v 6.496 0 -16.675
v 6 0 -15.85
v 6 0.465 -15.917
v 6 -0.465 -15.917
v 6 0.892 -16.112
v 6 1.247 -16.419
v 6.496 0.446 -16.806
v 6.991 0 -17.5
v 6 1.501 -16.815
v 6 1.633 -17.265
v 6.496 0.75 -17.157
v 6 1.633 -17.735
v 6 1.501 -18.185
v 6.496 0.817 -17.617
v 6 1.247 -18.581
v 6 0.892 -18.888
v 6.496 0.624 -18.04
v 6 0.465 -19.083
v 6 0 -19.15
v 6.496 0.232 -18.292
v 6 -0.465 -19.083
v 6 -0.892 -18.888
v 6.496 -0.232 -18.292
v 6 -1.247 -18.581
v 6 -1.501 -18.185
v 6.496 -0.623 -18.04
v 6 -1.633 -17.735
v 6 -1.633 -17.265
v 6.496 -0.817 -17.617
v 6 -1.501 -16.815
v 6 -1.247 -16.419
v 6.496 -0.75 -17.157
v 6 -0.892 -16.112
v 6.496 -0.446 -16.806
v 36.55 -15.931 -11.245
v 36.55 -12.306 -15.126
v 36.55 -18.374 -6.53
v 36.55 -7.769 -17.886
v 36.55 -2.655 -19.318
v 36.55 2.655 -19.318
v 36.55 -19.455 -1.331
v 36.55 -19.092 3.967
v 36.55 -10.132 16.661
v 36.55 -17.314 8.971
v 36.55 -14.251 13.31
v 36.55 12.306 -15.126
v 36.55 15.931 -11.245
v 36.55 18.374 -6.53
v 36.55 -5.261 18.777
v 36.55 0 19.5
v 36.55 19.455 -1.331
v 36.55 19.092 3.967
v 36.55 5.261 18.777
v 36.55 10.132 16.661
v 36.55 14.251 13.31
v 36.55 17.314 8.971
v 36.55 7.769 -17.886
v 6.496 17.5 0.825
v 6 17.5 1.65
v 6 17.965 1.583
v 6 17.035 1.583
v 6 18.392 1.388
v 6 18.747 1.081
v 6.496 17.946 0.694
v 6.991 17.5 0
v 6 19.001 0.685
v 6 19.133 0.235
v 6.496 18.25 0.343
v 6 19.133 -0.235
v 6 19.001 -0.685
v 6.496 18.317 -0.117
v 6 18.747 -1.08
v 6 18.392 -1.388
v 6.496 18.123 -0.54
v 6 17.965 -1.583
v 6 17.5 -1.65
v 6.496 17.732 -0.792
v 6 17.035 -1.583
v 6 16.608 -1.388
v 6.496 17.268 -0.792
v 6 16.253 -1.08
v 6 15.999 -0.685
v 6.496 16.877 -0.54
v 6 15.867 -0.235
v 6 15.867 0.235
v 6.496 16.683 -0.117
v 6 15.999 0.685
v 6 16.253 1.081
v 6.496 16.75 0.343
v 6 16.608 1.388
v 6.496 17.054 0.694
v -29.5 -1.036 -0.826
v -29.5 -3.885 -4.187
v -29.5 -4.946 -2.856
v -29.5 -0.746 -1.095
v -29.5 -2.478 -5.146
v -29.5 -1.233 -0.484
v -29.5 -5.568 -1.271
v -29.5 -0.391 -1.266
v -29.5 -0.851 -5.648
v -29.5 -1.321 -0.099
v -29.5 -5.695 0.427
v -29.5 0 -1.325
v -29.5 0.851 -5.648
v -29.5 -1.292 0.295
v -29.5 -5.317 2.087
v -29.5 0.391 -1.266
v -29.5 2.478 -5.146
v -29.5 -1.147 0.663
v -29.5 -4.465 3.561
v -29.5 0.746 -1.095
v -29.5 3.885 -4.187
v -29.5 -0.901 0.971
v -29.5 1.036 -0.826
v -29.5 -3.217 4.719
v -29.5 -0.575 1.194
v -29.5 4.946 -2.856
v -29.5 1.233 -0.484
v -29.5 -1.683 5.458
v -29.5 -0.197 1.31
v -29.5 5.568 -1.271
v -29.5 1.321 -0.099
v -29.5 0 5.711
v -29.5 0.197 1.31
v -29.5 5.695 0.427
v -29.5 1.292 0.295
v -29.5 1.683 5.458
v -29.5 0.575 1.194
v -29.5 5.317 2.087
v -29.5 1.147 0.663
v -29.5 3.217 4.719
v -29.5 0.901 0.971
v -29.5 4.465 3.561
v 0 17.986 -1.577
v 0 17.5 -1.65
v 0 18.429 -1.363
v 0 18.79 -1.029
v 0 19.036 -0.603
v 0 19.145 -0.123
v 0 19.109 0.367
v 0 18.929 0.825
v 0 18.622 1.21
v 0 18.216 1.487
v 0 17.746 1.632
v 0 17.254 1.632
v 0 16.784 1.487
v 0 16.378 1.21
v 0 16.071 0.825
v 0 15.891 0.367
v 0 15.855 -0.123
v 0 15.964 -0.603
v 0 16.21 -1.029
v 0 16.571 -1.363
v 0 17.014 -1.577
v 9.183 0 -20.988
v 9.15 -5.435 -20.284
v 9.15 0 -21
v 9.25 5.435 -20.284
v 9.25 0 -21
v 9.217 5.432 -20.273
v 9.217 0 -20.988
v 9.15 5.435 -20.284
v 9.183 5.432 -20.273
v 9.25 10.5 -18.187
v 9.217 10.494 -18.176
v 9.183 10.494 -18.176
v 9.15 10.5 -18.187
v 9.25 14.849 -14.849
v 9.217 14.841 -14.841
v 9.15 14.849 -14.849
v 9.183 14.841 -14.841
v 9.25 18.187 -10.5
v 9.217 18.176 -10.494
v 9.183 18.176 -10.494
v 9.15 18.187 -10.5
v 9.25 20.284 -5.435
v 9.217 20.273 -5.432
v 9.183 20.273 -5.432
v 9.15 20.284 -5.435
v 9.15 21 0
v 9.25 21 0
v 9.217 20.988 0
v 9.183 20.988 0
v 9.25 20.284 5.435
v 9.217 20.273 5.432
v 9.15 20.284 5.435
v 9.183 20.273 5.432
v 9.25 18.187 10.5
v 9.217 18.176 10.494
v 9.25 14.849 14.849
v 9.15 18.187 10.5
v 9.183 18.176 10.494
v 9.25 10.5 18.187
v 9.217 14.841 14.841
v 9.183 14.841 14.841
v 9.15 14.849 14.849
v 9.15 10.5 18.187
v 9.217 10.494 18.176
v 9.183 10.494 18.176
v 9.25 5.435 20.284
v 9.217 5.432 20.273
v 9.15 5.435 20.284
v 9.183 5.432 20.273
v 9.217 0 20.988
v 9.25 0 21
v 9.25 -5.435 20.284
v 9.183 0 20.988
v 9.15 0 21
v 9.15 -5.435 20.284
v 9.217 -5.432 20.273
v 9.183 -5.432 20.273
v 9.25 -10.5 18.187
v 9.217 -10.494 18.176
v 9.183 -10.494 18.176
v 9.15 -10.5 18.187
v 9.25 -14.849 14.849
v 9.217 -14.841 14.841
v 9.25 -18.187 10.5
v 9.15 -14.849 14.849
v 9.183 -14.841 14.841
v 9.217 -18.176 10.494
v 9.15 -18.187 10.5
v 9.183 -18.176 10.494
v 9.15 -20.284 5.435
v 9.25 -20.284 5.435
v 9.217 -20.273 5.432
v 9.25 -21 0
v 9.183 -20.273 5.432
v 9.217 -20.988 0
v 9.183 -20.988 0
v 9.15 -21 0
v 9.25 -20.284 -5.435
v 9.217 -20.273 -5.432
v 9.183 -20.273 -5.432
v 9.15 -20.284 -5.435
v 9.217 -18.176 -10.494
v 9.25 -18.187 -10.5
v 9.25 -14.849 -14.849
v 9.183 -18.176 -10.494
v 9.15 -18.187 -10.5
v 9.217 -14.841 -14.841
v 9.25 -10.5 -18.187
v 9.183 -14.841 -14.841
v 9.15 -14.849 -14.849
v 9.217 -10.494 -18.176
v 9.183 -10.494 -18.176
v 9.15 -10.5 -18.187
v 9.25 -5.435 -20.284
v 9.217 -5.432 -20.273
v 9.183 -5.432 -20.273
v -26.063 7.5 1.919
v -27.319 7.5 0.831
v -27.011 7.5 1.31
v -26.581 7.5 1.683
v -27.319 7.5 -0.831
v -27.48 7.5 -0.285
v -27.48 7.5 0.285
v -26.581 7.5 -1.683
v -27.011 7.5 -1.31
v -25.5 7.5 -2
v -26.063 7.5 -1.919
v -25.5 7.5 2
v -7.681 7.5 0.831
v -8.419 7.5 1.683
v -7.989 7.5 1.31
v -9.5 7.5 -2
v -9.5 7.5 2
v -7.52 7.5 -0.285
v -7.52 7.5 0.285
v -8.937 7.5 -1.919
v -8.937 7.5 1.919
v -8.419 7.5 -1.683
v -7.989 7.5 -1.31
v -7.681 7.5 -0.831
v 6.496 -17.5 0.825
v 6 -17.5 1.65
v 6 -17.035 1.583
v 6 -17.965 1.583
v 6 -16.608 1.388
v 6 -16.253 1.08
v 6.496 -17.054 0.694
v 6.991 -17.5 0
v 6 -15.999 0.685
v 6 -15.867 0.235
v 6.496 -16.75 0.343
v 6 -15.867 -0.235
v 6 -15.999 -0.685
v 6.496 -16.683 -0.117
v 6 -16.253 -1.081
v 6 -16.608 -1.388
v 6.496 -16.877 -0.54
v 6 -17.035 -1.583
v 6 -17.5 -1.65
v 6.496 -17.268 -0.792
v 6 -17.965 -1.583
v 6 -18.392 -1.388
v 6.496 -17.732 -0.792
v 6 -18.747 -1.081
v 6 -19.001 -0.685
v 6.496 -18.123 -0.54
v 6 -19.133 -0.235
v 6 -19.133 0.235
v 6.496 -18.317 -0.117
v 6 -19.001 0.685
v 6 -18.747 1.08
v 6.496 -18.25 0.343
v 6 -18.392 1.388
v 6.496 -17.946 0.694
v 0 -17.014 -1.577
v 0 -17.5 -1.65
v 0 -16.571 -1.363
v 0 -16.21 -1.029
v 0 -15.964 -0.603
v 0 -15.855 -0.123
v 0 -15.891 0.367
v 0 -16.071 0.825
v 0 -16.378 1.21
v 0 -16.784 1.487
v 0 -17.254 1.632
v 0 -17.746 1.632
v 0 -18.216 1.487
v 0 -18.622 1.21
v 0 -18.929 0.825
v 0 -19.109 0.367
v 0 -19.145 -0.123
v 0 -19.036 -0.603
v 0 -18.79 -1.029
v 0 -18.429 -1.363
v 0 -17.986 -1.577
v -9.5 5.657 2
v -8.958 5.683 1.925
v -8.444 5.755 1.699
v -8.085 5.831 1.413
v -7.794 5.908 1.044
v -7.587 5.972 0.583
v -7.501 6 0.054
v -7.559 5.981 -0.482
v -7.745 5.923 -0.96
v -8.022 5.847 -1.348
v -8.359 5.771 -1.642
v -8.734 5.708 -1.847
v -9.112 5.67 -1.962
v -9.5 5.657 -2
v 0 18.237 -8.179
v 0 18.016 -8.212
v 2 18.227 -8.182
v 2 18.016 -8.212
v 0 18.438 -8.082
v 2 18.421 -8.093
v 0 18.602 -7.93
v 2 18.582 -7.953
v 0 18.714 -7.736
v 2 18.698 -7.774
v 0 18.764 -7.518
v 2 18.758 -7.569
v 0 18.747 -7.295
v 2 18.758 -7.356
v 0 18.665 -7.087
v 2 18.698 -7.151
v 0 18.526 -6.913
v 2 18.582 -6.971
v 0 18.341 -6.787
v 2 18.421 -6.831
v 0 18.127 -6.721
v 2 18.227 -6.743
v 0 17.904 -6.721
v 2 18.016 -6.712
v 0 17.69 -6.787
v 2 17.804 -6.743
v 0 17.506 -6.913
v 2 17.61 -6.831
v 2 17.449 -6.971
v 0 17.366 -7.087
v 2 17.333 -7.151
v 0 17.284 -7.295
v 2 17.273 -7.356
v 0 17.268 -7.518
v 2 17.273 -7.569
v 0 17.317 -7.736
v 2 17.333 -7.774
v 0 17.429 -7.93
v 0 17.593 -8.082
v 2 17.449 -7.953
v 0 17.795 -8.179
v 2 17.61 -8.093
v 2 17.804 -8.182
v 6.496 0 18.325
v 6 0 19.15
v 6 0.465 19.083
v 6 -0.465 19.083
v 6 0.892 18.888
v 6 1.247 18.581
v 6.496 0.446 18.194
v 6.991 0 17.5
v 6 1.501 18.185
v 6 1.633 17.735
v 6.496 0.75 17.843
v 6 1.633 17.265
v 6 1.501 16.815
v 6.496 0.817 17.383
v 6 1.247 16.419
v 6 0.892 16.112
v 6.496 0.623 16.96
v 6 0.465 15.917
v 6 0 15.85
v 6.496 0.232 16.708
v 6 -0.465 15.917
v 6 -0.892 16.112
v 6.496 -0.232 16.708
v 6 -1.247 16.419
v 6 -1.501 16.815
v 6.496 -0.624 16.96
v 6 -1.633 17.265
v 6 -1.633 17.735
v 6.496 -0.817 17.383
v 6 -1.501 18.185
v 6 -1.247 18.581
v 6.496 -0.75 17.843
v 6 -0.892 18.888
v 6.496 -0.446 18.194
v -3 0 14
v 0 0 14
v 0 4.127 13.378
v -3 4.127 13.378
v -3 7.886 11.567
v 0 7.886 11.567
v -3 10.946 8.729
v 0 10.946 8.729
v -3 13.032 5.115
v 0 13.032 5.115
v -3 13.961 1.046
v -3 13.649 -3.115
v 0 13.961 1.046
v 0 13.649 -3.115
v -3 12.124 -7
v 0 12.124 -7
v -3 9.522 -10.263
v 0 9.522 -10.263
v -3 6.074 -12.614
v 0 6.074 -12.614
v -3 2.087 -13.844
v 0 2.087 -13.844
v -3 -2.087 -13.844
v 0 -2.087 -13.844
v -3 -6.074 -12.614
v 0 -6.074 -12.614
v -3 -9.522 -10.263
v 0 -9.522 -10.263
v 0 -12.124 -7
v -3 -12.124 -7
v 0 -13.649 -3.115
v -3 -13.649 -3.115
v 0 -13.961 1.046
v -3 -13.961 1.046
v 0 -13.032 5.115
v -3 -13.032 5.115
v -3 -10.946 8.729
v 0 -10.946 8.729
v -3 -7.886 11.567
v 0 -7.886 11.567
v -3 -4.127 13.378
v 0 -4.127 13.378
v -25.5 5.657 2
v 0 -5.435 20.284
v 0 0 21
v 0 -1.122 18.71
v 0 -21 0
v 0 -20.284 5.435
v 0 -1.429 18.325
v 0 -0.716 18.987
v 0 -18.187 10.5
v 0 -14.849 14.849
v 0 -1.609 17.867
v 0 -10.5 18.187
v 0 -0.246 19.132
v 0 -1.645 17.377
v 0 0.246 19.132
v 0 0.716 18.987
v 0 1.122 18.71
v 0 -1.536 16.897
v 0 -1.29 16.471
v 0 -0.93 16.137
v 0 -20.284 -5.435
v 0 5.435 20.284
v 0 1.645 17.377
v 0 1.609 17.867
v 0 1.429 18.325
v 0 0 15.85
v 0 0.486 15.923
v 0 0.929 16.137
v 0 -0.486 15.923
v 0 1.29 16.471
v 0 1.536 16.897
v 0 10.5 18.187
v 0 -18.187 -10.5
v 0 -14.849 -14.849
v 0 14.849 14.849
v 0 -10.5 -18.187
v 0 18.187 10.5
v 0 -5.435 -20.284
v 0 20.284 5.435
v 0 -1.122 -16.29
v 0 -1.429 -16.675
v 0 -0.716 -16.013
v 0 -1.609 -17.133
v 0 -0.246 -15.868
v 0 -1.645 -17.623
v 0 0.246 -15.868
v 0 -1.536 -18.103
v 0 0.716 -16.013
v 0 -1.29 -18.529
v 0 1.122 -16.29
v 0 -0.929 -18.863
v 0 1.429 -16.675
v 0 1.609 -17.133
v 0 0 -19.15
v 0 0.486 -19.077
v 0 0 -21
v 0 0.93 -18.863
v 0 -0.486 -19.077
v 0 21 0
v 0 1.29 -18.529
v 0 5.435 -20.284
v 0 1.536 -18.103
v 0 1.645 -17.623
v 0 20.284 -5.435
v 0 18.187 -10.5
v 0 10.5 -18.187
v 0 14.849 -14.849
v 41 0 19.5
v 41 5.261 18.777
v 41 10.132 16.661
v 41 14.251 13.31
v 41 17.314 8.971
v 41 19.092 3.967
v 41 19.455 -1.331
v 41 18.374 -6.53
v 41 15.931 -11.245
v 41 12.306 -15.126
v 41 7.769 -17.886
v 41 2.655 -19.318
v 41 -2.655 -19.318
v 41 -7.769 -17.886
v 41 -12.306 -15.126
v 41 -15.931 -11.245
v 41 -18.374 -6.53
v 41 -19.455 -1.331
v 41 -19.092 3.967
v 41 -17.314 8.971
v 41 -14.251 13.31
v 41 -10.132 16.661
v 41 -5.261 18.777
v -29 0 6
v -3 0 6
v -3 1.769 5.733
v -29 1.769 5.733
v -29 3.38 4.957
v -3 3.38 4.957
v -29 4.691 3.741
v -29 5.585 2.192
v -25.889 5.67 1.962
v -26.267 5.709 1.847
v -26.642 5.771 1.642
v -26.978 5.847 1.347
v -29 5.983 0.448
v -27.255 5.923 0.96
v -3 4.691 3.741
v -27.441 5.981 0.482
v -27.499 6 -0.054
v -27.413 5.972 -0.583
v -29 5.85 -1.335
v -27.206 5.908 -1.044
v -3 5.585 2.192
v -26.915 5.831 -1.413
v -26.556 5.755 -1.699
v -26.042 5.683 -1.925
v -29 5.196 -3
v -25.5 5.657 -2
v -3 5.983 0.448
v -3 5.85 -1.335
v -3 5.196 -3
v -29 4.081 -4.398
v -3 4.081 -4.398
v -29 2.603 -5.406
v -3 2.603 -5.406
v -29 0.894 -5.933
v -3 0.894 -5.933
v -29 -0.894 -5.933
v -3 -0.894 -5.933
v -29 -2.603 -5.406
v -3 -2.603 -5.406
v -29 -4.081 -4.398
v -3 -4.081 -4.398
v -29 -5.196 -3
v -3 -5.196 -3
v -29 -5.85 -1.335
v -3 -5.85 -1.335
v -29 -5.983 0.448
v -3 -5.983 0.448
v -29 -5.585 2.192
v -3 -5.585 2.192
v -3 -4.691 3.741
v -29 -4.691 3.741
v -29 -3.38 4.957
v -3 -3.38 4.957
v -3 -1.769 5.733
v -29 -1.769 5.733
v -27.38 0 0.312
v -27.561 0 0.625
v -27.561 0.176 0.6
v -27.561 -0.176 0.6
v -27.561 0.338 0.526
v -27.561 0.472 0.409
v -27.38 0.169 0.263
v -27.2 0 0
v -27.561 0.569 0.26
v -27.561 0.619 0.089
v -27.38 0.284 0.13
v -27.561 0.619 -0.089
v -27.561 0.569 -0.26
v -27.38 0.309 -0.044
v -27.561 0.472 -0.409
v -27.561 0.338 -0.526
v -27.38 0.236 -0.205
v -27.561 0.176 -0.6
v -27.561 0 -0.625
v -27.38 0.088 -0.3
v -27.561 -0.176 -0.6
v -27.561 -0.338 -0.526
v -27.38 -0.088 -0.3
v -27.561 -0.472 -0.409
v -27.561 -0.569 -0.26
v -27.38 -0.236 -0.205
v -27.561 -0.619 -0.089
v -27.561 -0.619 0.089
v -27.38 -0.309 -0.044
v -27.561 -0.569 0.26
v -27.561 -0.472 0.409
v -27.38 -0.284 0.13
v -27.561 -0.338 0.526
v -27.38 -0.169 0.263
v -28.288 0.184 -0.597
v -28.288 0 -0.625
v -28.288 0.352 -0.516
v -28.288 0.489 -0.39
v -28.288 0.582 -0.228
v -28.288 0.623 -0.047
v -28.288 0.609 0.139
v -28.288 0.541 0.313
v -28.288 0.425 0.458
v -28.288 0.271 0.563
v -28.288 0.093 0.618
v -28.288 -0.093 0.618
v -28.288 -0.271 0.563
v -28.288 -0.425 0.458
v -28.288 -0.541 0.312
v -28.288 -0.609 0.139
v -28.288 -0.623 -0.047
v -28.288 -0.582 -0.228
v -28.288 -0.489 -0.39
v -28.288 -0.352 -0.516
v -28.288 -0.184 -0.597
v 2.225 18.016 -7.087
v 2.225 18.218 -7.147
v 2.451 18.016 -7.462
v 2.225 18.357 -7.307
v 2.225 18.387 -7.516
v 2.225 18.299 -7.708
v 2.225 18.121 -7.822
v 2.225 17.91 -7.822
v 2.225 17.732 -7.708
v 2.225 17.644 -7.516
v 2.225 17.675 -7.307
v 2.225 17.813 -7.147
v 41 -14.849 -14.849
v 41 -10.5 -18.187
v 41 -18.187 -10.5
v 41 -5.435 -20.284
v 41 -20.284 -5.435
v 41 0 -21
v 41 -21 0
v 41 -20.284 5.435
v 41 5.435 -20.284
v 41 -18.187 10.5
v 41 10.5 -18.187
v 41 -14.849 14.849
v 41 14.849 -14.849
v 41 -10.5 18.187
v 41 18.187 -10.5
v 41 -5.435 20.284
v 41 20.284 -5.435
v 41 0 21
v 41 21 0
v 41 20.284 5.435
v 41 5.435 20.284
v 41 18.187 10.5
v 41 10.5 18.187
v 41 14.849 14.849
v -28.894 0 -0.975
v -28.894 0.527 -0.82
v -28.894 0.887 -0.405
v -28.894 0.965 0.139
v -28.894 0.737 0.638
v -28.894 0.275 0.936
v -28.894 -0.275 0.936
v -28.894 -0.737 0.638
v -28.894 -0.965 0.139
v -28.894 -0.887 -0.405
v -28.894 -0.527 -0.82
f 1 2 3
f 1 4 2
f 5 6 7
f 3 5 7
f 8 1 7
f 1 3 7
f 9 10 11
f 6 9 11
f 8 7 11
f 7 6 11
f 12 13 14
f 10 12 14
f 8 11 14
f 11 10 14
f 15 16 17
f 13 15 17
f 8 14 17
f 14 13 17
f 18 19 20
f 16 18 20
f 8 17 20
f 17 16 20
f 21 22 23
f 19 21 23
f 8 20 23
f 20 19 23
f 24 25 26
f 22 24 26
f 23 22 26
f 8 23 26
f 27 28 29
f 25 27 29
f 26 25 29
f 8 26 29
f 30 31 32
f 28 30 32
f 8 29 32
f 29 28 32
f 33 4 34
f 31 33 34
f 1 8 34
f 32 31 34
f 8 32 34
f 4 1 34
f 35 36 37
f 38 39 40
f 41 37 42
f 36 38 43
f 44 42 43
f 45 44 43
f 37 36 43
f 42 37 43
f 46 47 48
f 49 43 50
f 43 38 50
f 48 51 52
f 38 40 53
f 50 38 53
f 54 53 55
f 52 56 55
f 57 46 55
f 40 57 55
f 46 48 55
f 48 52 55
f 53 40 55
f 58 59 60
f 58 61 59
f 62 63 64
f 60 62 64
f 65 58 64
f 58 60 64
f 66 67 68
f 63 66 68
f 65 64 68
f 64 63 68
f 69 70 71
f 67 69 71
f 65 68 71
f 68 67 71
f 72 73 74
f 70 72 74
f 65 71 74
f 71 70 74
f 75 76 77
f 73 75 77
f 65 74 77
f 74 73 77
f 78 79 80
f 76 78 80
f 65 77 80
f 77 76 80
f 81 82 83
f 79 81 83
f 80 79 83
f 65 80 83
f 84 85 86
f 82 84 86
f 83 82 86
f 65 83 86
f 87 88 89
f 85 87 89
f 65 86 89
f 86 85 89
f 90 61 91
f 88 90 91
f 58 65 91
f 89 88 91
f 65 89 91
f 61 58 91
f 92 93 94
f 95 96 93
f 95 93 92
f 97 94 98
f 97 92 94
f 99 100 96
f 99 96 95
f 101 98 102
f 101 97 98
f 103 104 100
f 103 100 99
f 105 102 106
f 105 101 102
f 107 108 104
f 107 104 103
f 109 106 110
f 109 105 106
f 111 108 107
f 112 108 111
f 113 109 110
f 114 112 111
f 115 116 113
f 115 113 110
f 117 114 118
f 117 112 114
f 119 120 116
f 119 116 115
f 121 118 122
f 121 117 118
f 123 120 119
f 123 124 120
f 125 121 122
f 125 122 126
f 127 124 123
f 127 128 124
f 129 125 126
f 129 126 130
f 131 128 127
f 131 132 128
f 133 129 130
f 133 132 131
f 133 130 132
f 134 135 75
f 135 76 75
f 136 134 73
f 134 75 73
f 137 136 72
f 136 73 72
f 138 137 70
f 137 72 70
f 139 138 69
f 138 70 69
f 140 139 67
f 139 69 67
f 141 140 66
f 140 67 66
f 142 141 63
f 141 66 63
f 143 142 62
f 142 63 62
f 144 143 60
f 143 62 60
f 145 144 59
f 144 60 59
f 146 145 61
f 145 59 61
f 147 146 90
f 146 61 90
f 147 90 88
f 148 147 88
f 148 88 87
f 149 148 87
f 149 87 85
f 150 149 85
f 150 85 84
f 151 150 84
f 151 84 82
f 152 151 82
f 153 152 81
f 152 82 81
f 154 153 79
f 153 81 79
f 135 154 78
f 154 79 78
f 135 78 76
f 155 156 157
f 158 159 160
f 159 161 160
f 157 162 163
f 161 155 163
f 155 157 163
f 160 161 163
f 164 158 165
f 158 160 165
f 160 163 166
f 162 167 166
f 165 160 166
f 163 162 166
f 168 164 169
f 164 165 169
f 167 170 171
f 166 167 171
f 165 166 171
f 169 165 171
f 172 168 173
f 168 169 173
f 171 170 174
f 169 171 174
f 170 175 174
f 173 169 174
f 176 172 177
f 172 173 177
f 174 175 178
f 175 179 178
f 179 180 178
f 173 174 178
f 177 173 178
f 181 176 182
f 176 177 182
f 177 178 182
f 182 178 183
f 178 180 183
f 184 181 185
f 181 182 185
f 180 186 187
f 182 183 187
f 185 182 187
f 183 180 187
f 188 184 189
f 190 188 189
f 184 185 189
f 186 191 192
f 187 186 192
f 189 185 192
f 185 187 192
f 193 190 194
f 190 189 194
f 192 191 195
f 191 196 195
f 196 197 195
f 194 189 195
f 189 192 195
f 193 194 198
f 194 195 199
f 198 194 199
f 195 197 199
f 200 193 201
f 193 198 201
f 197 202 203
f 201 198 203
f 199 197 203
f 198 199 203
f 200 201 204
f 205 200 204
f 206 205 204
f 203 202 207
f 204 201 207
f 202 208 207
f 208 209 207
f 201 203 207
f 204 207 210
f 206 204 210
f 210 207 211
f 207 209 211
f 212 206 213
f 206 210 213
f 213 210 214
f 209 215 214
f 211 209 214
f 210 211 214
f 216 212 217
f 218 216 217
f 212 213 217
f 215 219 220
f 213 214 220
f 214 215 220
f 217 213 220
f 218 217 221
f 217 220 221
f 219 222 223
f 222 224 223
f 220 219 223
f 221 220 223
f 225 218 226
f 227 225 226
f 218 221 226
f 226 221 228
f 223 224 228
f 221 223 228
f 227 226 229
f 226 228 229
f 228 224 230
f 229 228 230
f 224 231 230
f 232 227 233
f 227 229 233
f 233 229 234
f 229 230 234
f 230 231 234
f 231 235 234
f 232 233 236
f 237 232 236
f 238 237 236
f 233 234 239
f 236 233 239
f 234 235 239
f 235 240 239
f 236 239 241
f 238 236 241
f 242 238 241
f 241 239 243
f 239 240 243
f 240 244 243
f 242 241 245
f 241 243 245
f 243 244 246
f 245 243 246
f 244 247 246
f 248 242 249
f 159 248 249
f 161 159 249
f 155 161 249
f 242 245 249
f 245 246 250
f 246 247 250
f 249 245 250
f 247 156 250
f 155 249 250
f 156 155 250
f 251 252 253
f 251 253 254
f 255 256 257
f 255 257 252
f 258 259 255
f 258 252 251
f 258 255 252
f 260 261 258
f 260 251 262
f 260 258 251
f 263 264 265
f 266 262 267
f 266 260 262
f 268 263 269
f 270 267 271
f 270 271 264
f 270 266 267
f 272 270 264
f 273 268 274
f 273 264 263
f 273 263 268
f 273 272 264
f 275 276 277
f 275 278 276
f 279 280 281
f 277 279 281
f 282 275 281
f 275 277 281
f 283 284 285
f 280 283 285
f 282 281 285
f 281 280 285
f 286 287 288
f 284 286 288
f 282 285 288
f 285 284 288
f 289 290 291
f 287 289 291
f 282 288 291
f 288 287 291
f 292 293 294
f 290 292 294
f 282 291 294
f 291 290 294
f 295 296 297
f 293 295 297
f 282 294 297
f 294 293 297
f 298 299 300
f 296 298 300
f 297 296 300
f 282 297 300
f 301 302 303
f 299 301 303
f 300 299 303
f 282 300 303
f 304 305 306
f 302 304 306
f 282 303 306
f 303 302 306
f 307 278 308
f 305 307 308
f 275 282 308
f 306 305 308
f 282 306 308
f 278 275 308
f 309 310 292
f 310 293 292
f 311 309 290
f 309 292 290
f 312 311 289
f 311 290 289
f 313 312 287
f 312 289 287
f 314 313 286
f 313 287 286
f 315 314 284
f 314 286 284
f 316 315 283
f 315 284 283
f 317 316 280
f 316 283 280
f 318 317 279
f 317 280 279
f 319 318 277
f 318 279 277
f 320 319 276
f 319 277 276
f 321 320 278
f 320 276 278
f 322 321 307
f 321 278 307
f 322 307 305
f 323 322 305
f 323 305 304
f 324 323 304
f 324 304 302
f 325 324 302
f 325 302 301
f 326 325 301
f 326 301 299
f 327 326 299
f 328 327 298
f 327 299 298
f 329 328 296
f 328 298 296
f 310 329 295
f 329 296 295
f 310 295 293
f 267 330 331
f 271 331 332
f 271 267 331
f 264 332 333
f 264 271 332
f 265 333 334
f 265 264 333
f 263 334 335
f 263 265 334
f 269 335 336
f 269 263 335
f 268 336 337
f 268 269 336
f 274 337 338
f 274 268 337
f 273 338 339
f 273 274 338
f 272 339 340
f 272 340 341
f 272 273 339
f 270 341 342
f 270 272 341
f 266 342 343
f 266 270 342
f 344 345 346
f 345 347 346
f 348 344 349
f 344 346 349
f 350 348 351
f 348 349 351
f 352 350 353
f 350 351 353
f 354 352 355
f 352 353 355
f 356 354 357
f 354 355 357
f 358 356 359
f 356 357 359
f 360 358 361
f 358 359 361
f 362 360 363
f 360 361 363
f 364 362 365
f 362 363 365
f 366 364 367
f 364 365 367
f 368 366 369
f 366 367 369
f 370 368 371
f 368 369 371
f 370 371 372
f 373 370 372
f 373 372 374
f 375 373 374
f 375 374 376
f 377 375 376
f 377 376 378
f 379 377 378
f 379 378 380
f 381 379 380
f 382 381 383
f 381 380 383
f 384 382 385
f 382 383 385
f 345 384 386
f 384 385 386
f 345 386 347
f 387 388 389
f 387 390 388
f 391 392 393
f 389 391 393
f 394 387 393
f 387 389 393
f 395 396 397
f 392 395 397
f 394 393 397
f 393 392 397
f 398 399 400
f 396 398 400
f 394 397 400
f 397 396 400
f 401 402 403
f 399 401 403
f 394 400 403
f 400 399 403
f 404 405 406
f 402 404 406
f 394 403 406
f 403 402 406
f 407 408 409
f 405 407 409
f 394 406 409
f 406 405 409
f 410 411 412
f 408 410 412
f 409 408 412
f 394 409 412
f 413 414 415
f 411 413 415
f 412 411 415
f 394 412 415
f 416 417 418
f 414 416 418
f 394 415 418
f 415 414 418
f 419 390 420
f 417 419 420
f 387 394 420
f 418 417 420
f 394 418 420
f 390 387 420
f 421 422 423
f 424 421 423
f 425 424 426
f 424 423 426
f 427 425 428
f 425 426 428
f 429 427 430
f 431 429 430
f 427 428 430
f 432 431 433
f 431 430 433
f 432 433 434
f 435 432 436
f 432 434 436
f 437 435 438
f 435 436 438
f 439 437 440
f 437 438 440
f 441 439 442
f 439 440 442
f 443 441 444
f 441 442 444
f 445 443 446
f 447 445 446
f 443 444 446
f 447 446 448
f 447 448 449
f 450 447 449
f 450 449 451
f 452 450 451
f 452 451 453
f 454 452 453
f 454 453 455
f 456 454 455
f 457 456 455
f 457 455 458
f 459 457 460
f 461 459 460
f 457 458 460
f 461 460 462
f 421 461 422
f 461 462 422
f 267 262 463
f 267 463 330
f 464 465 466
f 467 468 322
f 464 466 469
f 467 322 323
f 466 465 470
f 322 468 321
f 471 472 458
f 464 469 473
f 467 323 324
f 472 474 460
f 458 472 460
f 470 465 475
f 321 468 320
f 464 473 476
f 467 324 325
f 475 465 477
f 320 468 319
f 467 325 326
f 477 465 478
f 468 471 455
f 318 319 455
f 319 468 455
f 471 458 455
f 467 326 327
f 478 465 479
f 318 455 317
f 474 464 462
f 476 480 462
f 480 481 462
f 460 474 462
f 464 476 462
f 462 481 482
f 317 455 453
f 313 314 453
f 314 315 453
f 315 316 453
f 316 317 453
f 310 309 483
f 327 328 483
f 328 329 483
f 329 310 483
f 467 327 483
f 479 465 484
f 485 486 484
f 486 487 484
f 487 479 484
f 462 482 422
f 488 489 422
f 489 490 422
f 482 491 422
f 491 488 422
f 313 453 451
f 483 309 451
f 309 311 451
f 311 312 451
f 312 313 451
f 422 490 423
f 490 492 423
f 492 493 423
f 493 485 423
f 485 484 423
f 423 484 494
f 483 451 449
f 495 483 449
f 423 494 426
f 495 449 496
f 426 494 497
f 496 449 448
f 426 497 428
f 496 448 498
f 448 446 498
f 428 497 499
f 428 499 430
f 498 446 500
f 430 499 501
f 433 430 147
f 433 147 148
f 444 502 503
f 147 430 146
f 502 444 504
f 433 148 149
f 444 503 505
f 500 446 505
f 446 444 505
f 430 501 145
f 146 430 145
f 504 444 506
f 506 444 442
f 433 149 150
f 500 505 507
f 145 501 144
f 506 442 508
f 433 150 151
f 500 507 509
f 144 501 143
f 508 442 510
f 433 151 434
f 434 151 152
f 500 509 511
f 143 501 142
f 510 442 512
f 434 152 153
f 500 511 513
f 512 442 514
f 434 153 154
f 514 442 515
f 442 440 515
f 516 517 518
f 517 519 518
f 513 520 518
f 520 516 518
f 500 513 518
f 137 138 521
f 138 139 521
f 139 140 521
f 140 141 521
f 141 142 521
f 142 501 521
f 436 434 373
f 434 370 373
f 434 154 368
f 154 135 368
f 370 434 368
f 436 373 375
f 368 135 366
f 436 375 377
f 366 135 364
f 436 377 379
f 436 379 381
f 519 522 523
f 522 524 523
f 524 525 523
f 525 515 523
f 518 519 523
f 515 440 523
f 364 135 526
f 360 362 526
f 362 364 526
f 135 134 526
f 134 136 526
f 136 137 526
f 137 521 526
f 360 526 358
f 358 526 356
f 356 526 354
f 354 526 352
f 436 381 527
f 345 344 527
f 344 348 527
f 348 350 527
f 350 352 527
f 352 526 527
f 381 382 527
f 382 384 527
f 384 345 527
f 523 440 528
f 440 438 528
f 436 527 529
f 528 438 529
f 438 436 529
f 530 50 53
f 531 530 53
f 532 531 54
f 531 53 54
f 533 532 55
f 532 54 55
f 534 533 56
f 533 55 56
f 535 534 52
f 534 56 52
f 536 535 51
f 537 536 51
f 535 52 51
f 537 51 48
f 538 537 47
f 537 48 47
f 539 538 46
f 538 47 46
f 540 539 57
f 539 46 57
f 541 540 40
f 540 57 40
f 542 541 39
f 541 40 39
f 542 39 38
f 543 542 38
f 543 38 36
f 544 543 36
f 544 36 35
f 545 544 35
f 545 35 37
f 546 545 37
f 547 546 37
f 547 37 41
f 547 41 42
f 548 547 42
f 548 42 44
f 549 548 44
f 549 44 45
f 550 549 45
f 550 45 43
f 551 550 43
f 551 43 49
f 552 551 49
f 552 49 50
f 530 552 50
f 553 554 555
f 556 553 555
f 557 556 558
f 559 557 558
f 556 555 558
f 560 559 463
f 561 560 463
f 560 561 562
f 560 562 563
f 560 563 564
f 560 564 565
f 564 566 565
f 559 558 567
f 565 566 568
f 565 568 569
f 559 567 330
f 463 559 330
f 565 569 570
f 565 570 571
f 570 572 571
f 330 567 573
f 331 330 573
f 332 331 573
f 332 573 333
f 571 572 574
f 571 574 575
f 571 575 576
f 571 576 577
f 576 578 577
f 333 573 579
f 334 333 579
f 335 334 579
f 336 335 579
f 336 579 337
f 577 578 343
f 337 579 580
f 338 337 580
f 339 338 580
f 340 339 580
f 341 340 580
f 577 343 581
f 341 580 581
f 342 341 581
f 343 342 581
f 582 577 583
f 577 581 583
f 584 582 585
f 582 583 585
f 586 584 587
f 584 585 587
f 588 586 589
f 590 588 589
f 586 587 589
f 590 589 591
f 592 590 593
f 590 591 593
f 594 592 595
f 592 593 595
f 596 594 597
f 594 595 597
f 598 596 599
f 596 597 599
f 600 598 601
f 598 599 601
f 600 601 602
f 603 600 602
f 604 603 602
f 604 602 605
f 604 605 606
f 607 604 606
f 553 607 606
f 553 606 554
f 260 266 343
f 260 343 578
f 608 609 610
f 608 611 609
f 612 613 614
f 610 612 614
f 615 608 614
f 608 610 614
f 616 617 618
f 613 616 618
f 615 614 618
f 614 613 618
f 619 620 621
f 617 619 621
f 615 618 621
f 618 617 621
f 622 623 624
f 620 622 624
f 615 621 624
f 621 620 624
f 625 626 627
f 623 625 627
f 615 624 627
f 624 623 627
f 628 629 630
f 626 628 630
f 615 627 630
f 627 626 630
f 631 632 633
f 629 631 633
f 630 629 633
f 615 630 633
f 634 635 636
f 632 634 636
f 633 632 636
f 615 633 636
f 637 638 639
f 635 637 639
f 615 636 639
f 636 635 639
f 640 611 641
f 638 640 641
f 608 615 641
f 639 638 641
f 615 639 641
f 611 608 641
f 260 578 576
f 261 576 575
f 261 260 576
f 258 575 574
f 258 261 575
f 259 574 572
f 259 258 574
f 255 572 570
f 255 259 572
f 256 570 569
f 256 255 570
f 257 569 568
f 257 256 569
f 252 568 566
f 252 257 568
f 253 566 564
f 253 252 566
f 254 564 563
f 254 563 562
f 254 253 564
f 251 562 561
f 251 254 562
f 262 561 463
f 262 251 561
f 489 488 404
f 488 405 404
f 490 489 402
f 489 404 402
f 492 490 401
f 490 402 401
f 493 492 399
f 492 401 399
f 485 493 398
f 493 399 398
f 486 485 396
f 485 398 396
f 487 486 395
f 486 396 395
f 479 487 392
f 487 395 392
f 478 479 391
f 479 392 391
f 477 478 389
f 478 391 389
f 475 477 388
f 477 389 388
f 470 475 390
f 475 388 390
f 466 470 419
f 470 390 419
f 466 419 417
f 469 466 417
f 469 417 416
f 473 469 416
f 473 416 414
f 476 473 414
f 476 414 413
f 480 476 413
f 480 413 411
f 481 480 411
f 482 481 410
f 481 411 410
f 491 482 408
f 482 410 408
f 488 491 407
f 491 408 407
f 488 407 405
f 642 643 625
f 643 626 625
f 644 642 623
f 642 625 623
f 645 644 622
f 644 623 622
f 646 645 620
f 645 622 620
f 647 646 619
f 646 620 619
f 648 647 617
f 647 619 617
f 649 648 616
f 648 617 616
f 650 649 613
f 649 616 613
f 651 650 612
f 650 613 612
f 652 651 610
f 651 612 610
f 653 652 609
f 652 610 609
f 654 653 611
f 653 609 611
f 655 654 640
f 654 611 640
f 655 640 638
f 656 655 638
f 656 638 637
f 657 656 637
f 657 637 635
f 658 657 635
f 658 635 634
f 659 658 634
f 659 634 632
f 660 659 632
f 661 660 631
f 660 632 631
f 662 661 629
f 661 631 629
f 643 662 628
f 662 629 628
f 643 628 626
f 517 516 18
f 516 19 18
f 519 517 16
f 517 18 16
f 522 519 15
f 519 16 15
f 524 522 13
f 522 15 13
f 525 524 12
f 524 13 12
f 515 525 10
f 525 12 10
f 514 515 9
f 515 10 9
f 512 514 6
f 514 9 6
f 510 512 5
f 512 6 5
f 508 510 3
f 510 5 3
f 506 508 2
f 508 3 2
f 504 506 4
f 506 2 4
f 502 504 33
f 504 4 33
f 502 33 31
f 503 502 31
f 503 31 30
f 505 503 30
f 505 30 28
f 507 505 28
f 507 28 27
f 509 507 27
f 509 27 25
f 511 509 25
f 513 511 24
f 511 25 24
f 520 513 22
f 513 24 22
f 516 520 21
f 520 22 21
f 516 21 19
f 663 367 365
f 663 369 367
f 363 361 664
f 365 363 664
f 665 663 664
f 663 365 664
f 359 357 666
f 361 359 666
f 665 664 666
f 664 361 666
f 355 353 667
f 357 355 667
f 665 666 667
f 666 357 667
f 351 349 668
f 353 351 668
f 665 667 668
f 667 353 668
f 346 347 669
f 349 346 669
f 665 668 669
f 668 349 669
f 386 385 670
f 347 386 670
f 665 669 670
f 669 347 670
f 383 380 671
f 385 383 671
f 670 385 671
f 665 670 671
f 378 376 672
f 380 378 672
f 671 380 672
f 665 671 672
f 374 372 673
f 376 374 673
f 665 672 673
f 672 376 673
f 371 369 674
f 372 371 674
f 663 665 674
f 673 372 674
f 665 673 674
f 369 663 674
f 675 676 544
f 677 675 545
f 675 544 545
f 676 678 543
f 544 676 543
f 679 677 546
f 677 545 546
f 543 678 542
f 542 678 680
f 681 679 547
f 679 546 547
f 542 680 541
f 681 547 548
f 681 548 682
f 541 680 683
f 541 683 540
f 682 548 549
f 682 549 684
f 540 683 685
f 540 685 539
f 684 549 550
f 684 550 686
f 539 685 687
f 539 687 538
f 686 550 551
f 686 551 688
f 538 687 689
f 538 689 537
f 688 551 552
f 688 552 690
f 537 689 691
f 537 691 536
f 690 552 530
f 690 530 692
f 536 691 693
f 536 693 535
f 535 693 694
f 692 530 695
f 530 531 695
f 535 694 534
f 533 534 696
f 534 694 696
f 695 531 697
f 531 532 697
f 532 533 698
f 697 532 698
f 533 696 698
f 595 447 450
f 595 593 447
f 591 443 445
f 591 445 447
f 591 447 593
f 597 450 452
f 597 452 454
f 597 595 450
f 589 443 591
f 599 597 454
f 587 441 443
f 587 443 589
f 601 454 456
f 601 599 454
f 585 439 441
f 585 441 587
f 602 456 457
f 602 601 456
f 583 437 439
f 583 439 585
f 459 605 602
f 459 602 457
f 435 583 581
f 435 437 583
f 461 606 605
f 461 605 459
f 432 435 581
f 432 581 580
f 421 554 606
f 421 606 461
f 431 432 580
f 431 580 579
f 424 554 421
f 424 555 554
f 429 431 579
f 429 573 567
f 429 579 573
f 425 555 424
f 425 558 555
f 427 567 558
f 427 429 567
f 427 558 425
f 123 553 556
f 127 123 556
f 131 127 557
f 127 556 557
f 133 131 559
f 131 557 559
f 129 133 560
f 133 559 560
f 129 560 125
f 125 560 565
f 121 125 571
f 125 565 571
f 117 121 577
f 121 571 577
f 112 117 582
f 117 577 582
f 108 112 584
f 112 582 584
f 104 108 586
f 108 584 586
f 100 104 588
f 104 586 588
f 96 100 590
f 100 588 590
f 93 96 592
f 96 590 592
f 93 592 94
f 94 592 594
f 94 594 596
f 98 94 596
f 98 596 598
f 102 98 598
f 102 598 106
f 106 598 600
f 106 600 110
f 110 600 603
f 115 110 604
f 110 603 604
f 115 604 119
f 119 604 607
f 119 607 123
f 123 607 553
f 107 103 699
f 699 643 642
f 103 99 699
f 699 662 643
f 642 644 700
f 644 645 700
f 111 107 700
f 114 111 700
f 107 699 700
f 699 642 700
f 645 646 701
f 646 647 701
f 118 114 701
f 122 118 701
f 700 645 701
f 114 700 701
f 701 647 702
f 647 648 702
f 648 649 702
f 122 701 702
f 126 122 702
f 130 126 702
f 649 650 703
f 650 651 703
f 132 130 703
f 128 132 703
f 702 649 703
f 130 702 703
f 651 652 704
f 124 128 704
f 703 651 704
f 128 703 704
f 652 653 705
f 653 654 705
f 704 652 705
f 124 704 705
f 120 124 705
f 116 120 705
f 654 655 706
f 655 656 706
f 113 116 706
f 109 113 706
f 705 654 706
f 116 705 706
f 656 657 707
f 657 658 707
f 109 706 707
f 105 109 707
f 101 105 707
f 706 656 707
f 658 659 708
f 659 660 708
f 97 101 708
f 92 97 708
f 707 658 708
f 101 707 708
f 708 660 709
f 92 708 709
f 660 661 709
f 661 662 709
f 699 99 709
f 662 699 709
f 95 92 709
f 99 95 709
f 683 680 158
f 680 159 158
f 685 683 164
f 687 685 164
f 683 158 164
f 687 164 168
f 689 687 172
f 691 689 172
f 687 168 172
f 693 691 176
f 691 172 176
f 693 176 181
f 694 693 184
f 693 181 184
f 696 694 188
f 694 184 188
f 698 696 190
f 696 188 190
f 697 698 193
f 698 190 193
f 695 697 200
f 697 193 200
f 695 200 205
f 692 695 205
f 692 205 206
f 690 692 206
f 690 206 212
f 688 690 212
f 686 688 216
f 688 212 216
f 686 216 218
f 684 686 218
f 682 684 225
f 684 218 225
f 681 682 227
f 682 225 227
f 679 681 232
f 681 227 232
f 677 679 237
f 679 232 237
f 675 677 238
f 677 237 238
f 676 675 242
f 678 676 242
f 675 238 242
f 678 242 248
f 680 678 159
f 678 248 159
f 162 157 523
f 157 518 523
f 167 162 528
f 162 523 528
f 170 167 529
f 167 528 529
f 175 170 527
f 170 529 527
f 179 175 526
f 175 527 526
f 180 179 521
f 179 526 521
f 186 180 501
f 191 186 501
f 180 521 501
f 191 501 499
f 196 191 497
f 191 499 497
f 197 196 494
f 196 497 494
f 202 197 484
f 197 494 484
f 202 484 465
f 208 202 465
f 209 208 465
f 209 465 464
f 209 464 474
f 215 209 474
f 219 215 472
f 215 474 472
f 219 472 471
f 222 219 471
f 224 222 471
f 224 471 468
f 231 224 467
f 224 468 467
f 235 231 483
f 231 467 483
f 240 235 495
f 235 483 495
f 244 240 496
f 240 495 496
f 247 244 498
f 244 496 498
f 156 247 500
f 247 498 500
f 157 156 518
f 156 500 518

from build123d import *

# Parameters (mm, degrees)
SKETCH2_R                              = 14
BOSS_EXTRUDE1_DEPTH                    = 3
SKETCH3_R                              = 6
BOSS_EXTRUDE2_DEPTH                    = 26.5
BOSS_EXTRUDE4_REACH                    = 56.169
BOSS_EXTRUDE4_END_RADIUS               = 6
M36_CLEARANCE_HOLE1_D                  = 39
M36_CLEARANCE_HOLE1_DEPTH              = 4.45
F_1_5_1_5_DIAMETER_HOLE1_D             = 1.5
F_1_5_1_5_DIAMETER_HOLE1_DEPTH         = 2
F_1_5_1_5_DIAMETER_HOLE1_TIP           = 0.450645464
F_3_3_3_3_DIAMETER_HOLE1_D             = 3.3
F_3_3_3_3_DIAMETER_HOLE1_DEPTH         = 6
F_3_3_3_3_DIAMETER_HOLE1_TIP           = 0.991420021
F_1_25_1_25_DIAMETER_HOLE1_D           = 1.25
F_1_25_1_25_DIAMETER_HOLE1_DEPTH       = 1.939156082
F_1_25_1_25_DIAMETER_HOLE1_CSINK_D     = 2.65
F_1_25_1_25_DIAMETER_HOLE1_CSINK_ANGLE = 60
F_1_25_1_25_DIAMETER_HOLE1_TIP         = 0.360843918
CHAMFER1_SIZE                          = 0.288675135
CHAMFER1_SIZE2                         = 0.5


with BuildPart() as part:
    # Sketch1 → Revolve1 (revolve)
    with BuildSketch(Plane.XY, mode=Mode.PRIVATE) as revolve1_sk:
        with BuildLine():
            Line((0, 21), (0, 0))
            Line((0, 0), (41, 0))
            Line((41, 0), (41, 21))
            Line((41, 21), (9.25, 21))
            ThreePointArc((9.25, 21), (9.2, 20.98660254), (9.15, 21))
            Line((9.15, 21), (0, 21))
        make_face()
    revolve(revolve1_sk.sketch.rotate(Axis((0, 0, 0), (1, 0, 0)), 270), axis=Axis((0, 0, 0), (1, 0, 0)))

    # Sketch2 → Boss-Extrude1 (add)
    with BuildSketch(Plane.ZY):
        Circle(SKETCH2_R)
    extrude(amount=BOSS_EXTRUDE1_DEPTH)

    # Sketch3 → Boss-Extrude2 (add)
    with BuildSketch(Plane.ZY.offset(3)):
        Circle(SKETCH3_R)
    extrude(amount=BOSS_EXTRUDE2_DEPTH)

    # Boss-Extrude4: up to this cylinder (the profile starts outside it)
    boss_extrude4_end = Plane(origin=(-17.5, 0, 0), z_dir=(1, 0, 0)) * Cylinder(BOSS_EXTRUDE4_END_RADIUS, 125.338, mode=Mode.PRIVATE)
    # Sketch5 → Boss-Extrude4 (add, up to the surface)
    with BuildSketch(Plane(origin=(0, 7.5, 0), x_dir=(1, 0, 0), z_dir=(0, 1, 0)), mode=Mode.PRIVATE) as boss_extrude4_sk1:
        with BuildLine():
            Line((-9.5, 2), (-25.5, 2))
            ThreePointArc((-25.5, 2), (-27.5, 0), (-25.5, -2))
            Line((-25.5, -2), (-9.5, -2))
            ThreePointArc((-9.5, -2), (-7.5, 0), (-9.5, 2))
        make_face()
    boss_extrude4_tool1 = extrude(boss_extrude4_sk1.sketch, amount=-BOSS_EXTRUDE4_REACH, mode=Mode.PRIVATE) - boss_extrude4_end
    add(boss_extrude4_tool1.solids().sort_by_distance((-17.5, 7.5, 0))[0])

    # M36 Clearance Hole1
    with Locations(Plane(origin=(41, 0, 0), x_dir=(0, 0, -1), z_dir=(1, 0, 0))):
        with Locations((0, 0)):
            Hole(M36_CLEARANCE_HOLE1_D / 2, depth=M36_CLEARANCE_HOLE1_DEPTH)

    # Ø1.5 (1.5) Diameter Hole1
    with Locations(Plane.ZY):
        with Locations((-7.462326931, 18.015650884)):
            Hole(F_1_5_1_5_DIAMETER_HOLE1_D / 2, depth=F_1_5_1_5_DIAMETER_HOLE1_DEPTH)
            with Locations((0, 0, -(F_1_5_1_5_DIAMETER_HOLE1_DEPTH + F_1_5_1_5_DIAMETER_HOLE1_TIP / 2))):  # 118° drill point
                Cone(0, F_1_5_1_5_DIAMETER_HOLE1_D / 2, F_1_5_1_5_DIAMETER_HOLE1_TIP, mode=Mode.SUBTRACT)

    # Ø3.3 (3.3) Diameter Hole1
    with Locations(Plane.ZY):
        with Locations((3.0543e-05, 17.5), (17.5, -3.0543e-05), (-3.0543e-05, -17.5), (-17.5, 3.0543e-05)):
            Hole(F_3_3_3_3_DIAMETER_HOLE1_D / 2, depth=F_3_3_3_3_DIAMETER_HOLE1_DEPTH)
            with Locations((0, 0, -(F_3_3_3_3_DIAMETER_HOLE1_DEPTH + F_3_3_3_3_DIAMETER_HOLE1_TIP / 2))):  # 118° drill point
                Cone(0, F_3_3_3_3_DIAMETER_HOLE1_D / 2, F_3_3_3_3_DIAMETER_HOLE1_TIP, mode=Mode.SUBTRACT)

    # Ø1.25 (1.25) Diameter Hole1
    with Locations(Plane.ZY.offset(29.5)):
        with Locations((0, 0)):
            CounterSinkHole(F_1_25_1_25_DIAMETER_HOLE1_D / 2, F_1_25_1_25_DIAMETER_HOLE1_CSINK_D / 2, depth=F_1_25_1_25_DIAMETER_HOLE1_DEPTH, counter_sink_angle=F_1_25_1_25_DIAMETER_HOLE1_CSINK_ANGLE)
            with Locations((0, 0, -(F_1_25_1_25_DIAMETER_HOLE1_DEPTH + F_1_25_1_25_DIAMETER_HOLE1_TIP / 2))):  # 120° drill point
                Cone(0, F_1_25_1_25_DIAMETER_HOLE1_D / 2, F_1_25_1_25_DIAMETER_HOLE1_TIP, mode=Mode.SUBTRACT)

    # Chamfer1
    chamfer1_edges = [part.edges().sort_by_distance(p)[0] for p in [
        (-29.5, 0, -6),
    ]]
    chamfer1_side = [part.faces().sort_by_distance(p)[0] for p in [
        (-29.5, 0, -5.830294373),
    ]]
    chamfer(chamfer1_edges, length=CHAMFER1_SIZE, length2=CHAMFER1_SIZE2, reference=chamfer1_side[0])


solid = part.part
